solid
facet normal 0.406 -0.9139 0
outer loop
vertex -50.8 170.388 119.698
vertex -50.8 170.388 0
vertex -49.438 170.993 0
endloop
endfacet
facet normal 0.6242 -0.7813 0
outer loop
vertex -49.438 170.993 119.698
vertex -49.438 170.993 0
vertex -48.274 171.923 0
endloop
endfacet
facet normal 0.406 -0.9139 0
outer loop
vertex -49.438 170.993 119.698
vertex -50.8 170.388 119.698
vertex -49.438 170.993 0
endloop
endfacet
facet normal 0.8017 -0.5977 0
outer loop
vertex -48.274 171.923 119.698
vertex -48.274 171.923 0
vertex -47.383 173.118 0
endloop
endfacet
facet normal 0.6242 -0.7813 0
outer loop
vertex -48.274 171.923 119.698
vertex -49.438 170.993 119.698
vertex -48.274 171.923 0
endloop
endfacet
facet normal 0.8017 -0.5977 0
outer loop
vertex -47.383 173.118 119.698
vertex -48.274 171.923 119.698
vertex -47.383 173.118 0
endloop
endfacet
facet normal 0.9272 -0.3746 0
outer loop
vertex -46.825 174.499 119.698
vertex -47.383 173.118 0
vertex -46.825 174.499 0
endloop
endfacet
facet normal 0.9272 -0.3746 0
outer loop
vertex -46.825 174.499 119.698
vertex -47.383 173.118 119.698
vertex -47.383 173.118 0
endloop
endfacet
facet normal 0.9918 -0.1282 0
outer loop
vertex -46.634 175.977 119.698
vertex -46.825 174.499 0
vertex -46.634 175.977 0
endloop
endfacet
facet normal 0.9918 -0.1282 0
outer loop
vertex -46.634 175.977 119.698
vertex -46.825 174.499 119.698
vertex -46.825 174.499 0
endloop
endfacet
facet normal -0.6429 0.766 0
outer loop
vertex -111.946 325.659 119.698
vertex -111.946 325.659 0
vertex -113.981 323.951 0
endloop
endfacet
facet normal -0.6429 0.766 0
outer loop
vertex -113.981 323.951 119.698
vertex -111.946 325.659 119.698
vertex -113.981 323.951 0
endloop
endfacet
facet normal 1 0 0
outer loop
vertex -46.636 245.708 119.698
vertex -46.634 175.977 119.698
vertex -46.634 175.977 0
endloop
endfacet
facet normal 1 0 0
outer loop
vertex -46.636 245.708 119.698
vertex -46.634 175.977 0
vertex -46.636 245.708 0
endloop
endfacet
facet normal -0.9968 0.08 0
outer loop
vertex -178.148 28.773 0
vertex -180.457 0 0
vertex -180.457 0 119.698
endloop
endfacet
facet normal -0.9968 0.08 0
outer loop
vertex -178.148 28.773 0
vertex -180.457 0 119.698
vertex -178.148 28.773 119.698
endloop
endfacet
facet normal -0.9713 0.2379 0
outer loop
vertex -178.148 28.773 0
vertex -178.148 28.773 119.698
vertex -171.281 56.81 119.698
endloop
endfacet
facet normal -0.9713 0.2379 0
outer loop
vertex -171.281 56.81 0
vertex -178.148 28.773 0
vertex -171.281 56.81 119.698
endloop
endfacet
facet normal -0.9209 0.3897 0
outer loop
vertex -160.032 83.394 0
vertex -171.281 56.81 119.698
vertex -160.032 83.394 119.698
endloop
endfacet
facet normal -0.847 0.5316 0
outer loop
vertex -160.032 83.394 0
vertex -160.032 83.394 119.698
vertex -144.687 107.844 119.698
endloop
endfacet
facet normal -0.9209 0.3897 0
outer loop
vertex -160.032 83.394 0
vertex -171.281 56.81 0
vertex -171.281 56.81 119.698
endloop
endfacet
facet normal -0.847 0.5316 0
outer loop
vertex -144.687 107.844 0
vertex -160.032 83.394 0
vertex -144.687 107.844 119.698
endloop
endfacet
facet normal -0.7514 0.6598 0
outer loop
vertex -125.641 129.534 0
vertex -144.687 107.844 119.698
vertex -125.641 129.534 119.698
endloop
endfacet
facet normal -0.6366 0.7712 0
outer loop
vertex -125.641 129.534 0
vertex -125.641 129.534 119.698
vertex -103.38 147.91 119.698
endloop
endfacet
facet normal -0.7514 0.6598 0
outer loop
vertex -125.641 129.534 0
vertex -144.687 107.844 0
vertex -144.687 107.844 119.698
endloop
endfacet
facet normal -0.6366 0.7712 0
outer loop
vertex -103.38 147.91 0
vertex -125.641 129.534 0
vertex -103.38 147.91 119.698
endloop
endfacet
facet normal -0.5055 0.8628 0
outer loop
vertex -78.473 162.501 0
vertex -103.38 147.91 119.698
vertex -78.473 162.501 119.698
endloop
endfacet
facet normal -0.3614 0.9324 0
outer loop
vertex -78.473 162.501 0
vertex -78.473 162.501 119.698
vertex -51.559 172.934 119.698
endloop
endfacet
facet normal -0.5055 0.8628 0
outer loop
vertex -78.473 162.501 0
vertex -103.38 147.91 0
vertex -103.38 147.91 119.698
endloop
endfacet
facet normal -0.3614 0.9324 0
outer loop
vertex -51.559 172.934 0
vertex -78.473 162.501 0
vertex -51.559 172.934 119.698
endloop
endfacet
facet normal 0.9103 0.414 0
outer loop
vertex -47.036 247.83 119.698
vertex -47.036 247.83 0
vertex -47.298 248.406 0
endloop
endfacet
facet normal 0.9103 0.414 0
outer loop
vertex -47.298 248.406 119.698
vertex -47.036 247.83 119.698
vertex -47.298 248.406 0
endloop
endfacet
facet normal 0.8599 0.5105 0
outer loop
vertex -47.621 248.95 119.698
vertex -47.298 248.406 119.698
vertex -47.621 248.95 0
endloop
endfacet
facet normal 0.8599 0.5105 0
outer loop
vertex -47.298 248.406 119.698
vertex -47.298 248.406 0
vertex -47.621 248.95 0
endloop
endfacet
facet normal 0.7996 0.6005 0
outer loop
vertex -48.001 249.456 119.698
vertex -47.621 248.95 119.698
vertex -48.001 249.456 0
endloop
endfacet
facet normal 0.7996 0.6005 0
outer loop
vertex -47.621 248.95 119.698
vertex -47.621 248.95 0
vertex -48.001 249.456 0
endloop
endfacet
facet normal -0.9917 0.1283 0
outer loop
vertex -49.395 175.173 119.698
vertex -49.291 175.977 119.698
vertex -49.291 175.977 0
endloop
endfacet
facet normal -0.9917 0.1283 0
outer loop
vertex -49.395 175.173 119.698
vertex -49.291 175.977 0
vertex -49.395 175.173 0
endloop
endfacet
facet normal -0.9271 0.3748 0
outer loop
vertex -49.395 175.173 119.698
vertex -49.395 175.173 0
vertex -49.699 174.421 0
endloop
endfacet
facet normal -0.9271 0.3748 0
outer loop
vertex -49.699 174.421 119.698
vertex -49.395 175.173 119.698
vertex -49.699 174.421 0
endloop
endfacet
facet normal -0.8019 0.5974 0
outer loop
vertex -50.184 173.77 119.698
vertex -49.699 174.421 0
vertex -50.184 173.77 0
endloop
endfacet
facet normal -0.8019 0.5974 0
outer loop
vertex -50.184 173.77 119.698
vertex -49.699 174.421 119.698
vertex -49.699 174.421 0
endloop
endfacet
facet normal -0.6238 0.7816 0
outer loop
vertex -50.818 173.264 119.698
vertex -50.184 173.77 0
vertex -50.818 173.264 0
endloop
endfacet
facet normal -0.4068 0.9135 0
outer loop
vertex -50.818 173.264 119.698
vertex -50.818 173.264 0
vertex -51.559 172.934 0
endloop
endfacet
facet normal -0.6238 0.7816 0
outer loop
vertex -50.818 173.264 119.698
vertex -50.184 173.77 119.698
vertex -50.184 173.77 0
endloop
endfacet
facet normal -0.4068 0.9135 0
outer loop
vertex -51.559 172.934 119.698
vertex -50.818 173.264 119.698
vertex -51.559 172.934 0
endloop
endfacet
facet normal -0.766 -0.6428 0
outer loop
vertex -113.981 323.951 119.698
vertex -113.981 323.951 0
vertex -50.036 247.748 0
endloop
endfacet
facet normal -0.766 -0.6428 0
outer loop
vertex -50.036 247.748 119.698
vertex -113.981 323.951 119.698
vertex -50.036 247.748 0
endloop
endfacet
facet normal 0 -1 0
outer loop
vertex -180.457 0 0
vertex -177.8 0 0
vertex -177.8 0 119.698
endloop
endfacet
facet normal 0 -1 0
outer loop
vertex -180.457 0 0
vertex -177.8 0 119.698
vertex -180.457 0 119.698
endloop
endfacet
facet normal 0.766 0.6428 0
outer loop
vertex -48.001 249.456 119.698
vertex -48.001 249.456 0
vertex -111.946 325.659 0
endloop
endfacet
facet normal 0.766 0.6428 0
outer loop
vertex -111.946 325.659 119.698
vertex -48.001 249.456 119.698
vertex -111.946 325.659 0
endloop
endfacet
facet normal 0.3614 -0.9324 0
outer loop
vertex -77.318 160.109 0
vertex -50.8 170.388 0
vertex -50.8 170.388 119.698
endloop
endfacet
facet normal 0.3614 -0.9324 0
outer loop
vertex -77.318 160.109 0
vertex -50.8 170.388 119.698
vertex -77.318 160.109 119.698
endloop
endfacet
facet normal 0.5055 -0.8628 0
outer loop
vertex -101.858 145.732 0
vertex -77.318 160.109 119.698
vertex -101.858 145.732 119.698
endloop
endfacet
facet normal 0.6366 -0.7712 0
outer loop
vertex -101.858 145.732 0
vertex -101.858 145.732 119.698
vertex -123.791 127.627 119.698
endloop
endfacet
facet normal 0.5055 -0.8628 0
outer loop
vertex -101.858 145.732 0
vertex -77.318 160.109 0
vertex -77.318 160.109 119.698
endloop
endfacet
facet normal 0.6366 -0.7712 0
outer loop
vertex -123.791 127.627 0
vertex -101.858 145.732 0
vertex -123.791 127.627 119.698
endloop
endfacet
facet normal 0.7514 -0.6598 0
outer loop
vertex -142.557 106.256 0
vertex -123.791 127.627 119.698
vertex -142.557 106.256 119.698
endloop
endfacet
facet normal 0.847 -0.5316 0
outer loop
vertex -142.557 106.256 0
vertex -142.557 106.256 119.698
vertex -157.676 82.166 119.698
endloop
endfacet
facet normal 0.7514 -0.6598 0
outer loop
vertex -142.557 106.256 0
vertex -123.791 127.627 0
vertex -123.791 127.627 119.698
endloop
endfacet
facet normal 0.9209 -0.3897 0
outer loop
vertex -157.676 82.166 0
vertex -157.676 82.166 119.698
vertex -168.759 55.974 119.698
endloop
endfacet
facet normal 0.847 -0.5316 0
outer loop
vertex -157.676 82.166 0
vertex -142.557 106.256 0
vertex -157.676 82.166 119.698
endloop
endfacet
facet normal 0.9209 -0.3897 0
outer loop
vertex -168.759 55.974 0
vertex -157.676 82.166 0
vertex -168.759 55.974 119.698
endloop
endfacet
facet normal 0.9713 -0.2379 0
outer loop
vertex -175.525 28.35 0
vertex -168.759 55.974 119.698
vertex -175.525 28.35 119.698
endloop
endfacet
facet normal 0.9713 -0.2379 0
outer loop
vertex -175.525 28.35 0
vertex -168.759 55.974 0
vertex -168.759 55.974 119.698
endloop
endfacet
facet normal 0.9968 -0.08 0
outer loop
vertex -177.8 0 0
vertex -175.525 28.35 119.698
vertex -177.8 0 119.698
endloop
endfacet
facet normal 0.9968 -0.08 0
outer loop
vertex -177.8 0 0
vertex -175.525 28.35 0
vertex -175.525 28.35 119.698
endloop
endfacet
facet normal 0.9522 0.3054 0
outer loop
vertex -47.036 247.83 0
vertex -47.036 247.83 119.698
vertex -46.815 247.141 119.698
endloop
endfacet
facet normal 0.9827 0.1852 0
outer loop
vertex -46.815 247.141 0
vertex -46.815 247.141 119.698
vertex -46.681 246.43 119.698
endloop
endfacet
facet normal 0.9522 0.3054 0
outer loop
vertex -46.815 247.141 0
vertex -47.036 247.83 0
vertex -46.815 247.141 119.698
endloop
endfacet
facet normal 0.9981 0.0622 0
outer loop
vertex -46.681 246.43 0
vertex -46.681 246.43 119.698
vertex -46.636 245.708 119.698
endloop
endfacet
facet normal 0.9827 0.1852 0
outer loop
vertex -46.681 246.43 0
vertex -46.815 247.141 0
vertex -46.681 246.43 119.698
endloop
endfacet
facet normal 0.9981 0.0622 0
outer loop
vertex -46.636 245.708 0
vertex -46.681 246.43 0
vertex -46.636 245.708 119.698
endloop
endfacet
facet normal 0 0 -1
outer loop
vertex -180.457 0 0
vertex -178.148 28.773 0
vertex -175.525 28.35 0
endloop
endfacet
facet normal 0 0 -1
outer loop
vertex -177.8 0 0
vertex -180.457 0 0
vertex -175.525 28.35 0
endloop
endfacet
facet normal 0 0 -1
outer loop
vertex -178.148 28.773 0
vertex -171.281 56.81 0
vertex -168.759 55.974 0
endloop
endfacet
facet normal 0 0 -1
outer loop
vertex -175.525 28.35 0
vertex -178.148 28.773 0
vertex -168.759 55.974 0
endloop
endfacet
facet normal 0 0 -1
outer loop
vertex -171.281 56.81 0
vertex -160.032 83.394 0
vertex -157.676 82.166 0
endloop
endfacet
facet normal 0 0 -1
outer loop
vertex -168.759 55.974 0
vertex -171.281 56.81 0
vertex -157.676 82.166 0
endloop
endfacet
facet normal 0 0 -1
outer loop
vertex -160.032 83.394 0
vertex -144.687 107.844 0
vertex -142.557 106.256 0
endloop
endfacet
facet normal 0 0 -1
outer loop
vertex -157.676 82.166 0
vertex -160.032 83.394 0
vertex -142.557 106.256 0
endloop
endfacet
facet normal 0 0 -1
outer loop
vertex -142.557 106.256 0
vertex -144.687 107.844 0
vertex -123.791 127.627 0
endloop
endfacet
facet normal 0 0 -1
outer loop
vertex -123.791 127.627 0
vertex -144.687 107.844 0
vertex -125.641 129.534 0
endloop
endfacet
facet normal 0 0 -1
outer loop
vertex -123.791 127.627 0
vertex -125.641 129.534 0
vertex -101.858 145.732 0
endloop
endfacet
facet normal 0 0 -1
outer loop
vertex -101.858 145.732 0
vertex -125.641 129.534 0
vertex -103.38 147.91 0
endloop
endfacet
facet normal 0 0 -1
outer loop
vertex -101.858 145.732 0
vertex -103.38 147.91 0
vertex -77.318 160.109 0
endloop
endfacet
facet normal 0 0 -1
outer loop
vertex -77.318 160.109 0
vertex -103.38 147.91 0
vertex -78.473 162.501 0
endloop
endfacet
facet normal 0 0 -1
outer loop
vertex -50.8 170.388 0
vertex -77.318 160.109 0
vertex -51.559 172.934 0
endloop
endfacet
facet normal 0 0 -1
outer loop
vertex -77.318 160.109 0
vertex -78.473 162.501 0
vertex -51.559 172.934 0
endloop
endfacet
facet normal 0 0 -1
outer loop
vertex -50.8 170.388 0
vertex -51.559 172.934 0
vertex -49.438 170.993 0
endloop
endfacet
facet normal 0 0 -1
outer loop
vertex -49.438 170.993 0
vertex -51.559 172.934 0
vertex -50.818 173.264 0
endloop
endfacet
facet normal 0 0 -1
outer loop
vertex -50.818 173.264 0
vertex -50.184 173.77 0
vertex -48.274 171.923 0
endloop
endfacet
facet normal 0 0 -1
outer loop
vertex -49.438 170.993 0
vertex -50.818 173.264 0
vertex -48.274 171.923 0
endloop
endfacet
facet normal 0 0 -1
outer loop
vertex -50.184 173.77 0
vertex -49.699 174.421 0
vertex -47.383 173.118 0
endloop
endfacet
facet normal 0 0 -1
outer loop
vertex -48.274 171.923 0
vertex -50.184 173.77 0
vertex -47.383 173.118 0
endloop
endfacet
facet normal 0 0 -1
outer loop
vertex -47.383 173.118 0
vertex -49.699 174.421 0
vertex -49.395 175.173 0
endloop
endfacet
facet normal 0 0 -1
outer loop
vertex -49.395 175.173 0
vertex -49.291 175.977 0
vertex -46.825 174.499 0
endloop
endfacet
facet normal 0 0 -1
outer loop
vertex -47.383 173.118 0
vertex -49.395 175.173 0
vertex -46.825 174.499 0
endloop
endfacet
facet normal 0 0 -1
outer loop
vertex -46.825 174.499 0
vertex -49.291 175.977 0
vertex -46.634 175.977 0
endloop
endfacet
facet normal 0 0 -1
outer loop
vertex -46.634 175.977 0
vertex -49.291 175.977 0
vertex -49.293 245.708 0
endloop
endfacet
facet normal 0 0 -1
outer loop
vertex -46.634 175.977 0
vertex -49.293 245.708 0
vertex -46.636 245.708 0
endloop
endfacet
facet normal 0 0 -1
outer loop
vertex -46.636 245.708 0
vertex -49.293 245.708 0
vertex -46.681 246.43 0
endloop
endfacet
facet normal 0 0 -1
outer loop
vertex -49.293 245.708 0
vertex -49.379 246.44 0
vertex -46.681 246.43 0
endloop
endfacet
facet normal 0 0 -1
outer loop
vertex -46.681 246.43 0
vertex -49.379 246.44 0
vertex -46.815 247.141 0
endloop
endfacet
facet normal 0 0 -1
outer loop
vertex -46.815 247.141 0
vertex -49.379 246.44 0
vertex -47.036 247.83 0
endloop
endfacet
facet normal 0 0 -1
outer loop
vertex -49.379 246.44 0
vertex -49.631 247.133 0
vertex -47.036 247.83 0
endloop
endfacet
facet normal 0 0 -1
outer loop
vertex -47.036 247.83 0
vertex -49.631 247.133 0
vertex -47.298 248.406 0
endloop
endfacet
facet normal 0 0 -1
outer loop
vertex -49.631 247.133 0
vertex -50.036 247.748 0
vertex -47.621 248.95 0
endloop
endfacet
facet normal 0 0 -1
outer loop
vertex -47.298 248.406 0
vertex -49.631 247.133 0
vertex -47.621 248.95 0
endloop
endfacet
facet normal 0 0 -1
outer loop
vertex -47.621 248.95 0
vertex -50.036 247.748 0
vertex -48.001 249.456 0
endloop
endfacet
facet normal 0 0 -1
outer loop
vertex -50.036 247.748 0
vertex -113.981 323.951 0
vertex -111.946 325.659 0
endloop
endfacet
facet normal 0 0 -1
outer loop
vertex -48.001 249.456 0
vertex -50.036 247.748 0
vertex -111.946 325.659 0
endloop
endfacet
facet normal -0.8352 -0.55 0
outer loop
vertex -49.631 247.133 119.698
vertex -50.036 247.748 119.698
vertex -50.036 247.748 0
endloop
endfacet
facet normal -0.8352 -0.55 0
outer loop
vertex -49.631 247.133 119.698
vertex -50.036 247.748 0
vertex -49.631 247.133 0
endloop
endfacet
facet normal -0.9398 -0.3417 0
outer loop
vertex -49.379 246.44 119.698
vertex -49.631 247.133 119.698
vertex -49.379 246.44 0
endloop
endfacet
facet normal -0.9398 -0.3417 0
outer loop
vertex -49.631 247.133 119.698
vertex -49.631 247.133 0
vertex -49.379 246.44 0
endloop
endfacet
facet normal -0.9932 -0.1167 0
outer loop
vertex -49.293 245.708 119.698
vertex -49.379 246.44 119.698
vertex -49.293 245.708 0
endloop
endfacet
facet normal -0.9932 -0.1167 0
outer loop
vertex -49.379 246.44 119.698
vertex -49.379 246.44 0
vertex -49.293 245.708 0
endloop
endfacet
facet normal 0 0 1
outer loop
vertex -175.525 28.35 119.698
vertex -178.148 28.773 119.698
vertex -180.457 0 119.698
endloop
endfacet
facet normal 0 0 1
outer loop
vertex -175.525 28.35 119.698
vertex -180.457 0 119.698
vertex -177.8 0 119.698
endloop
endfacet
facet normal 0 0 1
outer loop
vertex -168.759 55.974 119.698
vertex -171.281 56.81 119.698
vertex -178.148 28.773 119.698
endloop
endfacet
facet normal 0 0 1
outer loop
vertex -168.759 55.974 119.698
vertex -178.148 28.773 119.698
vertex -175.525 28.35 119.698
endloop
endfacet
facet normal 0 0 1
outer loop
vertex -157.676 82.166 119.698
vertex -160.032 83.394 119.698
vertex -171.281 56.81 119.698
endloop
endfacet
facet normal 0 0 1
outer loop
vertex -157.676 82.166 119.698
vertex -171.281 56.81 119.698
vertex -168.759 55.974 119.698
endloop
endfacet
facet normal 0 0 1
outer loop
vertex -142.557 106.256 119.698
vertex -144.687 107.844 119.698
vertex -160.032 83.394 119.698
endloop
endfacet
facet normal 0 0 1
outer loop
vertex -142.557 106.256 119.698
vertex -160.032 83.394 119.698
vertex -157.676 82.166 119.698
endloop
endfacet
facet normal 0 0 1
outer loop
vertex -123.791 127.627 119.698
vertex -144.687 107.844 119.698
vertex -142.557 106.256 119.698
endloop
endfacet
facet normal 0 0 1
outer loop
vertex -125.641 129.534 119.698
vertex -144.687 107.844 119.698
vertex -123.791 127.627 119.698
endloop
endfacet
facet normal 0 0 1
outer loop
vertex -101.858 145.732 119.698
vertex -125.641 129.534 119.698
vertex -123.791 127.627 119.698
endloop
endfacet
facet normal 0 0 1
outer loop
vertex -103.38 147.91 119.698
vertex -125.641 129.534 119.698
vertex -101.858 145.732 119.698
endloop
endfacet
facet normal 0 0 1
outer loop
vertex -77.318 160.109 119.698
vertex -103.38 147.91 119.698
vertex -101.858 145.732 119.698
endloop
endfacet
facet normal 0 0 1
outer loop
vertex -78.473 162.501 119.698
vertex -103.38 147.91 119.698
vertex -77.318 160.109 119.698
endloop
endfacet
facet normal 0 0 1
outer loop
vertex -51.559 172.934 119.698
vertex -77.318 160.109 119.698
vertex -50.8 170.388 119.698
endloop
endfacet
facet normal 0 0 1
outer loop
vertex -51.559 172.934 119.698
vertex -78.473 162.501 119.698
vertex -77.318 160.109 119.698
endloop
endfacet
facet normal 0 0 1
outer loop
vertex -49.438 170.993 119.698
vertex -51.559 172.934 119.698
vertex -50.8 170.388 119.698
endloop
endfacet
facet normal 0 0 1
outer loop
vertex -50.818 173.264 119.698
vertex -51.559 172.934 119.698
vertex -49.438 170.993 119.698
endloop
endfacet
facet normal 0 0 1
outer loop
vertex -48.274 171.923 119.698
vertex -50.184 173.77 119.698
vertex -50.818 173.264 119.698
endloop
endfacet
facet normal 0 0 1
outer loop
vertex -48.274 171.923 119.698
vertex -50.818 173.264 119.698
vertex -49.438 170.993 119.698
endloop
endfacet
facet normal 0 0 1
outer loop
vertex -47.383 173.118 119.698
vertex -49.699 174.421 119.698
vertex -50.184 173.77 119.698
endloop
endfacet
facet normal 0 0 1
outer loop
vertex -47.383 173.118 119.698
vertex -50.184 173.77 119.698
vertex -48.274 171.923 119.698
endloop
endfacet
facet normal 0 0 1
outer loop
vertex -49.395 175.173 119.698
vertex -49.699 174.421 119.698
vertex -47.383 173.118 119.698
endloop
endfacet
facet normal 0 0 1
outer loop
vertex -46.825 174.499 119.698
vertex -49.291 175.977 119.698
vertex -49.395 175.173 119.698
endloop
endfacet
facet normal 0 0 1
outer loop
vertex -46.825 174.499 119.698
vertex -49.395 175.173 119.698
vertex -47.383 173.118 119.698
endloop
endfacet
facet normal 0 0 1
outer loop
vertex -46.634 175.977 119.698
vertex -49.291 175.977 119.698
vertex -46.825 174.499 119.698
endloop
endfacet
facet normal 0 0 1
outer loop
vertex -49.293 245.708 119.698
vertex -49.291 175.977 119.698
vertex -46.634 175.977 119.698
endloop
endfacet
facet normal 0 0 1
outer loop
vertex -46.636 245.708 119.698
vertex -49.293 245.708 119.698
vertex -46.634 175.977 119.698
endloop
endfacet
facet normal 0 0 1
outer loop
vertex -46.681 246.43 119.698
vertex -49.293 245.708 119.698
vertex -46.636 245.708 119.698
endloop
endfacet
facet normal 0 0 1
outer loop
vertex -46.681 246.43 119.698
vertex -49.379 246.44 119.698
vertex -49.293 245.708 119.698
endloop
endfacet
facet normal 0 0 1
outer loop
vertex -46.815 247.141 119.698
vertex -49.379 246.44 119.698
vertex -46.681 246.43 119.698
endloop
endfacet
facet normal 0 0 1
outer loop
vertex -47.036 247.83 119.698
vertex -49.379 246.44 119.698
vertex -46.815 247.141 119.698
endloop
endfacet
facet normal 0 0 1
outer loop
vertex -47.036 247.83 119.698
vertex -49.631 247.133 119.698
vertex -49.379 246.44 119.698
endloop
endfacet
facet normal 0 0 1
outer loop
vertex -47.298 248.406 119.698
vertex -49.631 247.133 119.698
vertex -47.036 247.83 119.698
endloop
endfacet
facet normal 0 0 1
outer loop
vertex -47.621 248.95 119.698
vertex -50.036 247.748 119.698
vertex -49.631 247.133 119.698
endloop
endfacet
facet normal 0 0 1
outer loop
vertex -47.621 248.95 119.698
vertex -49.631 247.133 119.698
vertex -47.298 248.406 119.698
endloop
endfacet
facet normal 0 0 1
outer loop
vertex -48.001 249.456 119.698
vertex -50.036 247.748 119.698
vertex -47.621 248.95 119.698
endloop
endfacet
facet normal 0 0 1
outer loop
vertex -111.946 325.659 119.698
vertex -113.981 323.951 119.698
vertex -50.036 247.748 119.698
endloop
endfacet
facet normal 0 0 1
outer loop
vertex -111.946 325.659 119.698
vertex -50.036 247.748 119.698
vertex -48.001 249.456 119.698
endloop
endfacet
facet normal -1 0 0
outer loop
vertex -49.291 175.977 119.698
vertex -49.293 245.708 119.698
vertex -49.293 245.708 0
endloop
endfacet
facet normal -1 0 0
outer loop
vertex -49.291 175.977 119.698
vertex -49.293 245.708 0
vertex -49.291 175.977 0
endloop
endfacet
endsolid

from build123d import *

# Parameters (mm, degrees)
BASE_FLANGE1_DEPTH   = 119.6975
EDGE_FLANGE1_DEPTH   = 119.6975
EDGE_FLANGE2_DEPTH   = 119.6975
EDGE_FLANGE2_2_DEPTH = 119.6975


# Read off the part's stored shape, not the designer's step: Edge-Flange2
# Sheet-metal steps are written as plain solids
with BuildPart() as part:
    # Sketch1 → Base-Flange1 (new body)
    with BuildSketch(Plane.XY):
        with BuildLine():
            ThreePointArc((-50.8, 170.388379885), (-142.557146436, 106.25582337), (-177.8, 0))
            Line((-177.8, 0), (-180.45684, 0))
            ThreePointArc((-180.45684, 0), (-144.68735751, 107.843588959), (-51.559097143, 172.934469105))
            Line((-51.559097143, 172.934469105), (-50.8, 170.388379885))
        make_face()
    extrude(amount=BASE_FLANGE1_DEPTH)

    # Edge-Flange1 section (across the edge) → Edge-Flange1 (add)
    with BuildSketch(Plane(origin=(-49.291175996, 173.610632552, 119.6975), x_dir=(-0.9999999996342678, -2.7045604981568168e-05, 0), z_dir=(0, 0, -1))):
        with BuildLine():
            Line((-2.65684, 2.366572064), (-2.65684, 74.219652496))
            Line((-2.65684, 74.219652496), (0, 74.219652496))
            Line((0, 74.219652496), (0, 2.366572064))
            ThreePointArc((0, 2.366572064), (0.62936233, 0.469112223), (2.267939433, -0.676102109))
            Line((2.267939433, -0.676102109), (1.508911151, -3.222211858))
            ThreePointArc((1.508911151, -3.222211858), (-1.500827273, -1.118682173), (-2.65684, 2.366572064))
        make_face()
    extrude(amount=EDGE_FLANGE1_DEPTH)

    # Edge-Flange2 outline → Edge-Flange2 (cut)
    with BuildSketch(Plane.XY):
        with BuildLine():
            Line((-46.636343312, 247.830356877), (-47.036345835, 247.830346059))
            ThreePointArc((-47.036345835, 247.830346059), (-46.737188142, 246.787726569), (-46.636285905, 245.707740707))
            Line((-46.636285905, 245.707740707), (-46.636343312, 247.830356877))
        make_face()
    extrude(amount=EDGE_FLANGE2_DEPTH, mode=Mode.SUBTRACT)

    # Edge-Flange2 2 outline → Edge-Flange2 2 (add)
    with BuildSketch(Plane.XY):
        with BuildLine():
            ThreePointArc((-47.036345835, 247.830346059), (-47.452236843, 248.682682095), (-48.000778663, 249.456338298))
            Line((-48.000778663, 249.456338298), (-111.945669395, 325.658705996))
            Line((-111.945669395, 325.658705996), (-113.980880724, 323.950867119))
            Line((-113.980880724, 323.950867119), (-50.035989993, 247.748499421))
            ThreePointArc((-50.035989993, 247.748499421), (-49.484631202, 246.793577627), (-49.293125904, 245.707668851))
            Line((-49.293125904, 245.707668851), (-49.293183311, 247.830285021))
            Line((-49.293183311, 247.830285021), (-47.036345835, 247.830346059))
        make_face()
    extrude(amount=EDGE_FLANGE2_2_DEPTH)


solid = part.part
